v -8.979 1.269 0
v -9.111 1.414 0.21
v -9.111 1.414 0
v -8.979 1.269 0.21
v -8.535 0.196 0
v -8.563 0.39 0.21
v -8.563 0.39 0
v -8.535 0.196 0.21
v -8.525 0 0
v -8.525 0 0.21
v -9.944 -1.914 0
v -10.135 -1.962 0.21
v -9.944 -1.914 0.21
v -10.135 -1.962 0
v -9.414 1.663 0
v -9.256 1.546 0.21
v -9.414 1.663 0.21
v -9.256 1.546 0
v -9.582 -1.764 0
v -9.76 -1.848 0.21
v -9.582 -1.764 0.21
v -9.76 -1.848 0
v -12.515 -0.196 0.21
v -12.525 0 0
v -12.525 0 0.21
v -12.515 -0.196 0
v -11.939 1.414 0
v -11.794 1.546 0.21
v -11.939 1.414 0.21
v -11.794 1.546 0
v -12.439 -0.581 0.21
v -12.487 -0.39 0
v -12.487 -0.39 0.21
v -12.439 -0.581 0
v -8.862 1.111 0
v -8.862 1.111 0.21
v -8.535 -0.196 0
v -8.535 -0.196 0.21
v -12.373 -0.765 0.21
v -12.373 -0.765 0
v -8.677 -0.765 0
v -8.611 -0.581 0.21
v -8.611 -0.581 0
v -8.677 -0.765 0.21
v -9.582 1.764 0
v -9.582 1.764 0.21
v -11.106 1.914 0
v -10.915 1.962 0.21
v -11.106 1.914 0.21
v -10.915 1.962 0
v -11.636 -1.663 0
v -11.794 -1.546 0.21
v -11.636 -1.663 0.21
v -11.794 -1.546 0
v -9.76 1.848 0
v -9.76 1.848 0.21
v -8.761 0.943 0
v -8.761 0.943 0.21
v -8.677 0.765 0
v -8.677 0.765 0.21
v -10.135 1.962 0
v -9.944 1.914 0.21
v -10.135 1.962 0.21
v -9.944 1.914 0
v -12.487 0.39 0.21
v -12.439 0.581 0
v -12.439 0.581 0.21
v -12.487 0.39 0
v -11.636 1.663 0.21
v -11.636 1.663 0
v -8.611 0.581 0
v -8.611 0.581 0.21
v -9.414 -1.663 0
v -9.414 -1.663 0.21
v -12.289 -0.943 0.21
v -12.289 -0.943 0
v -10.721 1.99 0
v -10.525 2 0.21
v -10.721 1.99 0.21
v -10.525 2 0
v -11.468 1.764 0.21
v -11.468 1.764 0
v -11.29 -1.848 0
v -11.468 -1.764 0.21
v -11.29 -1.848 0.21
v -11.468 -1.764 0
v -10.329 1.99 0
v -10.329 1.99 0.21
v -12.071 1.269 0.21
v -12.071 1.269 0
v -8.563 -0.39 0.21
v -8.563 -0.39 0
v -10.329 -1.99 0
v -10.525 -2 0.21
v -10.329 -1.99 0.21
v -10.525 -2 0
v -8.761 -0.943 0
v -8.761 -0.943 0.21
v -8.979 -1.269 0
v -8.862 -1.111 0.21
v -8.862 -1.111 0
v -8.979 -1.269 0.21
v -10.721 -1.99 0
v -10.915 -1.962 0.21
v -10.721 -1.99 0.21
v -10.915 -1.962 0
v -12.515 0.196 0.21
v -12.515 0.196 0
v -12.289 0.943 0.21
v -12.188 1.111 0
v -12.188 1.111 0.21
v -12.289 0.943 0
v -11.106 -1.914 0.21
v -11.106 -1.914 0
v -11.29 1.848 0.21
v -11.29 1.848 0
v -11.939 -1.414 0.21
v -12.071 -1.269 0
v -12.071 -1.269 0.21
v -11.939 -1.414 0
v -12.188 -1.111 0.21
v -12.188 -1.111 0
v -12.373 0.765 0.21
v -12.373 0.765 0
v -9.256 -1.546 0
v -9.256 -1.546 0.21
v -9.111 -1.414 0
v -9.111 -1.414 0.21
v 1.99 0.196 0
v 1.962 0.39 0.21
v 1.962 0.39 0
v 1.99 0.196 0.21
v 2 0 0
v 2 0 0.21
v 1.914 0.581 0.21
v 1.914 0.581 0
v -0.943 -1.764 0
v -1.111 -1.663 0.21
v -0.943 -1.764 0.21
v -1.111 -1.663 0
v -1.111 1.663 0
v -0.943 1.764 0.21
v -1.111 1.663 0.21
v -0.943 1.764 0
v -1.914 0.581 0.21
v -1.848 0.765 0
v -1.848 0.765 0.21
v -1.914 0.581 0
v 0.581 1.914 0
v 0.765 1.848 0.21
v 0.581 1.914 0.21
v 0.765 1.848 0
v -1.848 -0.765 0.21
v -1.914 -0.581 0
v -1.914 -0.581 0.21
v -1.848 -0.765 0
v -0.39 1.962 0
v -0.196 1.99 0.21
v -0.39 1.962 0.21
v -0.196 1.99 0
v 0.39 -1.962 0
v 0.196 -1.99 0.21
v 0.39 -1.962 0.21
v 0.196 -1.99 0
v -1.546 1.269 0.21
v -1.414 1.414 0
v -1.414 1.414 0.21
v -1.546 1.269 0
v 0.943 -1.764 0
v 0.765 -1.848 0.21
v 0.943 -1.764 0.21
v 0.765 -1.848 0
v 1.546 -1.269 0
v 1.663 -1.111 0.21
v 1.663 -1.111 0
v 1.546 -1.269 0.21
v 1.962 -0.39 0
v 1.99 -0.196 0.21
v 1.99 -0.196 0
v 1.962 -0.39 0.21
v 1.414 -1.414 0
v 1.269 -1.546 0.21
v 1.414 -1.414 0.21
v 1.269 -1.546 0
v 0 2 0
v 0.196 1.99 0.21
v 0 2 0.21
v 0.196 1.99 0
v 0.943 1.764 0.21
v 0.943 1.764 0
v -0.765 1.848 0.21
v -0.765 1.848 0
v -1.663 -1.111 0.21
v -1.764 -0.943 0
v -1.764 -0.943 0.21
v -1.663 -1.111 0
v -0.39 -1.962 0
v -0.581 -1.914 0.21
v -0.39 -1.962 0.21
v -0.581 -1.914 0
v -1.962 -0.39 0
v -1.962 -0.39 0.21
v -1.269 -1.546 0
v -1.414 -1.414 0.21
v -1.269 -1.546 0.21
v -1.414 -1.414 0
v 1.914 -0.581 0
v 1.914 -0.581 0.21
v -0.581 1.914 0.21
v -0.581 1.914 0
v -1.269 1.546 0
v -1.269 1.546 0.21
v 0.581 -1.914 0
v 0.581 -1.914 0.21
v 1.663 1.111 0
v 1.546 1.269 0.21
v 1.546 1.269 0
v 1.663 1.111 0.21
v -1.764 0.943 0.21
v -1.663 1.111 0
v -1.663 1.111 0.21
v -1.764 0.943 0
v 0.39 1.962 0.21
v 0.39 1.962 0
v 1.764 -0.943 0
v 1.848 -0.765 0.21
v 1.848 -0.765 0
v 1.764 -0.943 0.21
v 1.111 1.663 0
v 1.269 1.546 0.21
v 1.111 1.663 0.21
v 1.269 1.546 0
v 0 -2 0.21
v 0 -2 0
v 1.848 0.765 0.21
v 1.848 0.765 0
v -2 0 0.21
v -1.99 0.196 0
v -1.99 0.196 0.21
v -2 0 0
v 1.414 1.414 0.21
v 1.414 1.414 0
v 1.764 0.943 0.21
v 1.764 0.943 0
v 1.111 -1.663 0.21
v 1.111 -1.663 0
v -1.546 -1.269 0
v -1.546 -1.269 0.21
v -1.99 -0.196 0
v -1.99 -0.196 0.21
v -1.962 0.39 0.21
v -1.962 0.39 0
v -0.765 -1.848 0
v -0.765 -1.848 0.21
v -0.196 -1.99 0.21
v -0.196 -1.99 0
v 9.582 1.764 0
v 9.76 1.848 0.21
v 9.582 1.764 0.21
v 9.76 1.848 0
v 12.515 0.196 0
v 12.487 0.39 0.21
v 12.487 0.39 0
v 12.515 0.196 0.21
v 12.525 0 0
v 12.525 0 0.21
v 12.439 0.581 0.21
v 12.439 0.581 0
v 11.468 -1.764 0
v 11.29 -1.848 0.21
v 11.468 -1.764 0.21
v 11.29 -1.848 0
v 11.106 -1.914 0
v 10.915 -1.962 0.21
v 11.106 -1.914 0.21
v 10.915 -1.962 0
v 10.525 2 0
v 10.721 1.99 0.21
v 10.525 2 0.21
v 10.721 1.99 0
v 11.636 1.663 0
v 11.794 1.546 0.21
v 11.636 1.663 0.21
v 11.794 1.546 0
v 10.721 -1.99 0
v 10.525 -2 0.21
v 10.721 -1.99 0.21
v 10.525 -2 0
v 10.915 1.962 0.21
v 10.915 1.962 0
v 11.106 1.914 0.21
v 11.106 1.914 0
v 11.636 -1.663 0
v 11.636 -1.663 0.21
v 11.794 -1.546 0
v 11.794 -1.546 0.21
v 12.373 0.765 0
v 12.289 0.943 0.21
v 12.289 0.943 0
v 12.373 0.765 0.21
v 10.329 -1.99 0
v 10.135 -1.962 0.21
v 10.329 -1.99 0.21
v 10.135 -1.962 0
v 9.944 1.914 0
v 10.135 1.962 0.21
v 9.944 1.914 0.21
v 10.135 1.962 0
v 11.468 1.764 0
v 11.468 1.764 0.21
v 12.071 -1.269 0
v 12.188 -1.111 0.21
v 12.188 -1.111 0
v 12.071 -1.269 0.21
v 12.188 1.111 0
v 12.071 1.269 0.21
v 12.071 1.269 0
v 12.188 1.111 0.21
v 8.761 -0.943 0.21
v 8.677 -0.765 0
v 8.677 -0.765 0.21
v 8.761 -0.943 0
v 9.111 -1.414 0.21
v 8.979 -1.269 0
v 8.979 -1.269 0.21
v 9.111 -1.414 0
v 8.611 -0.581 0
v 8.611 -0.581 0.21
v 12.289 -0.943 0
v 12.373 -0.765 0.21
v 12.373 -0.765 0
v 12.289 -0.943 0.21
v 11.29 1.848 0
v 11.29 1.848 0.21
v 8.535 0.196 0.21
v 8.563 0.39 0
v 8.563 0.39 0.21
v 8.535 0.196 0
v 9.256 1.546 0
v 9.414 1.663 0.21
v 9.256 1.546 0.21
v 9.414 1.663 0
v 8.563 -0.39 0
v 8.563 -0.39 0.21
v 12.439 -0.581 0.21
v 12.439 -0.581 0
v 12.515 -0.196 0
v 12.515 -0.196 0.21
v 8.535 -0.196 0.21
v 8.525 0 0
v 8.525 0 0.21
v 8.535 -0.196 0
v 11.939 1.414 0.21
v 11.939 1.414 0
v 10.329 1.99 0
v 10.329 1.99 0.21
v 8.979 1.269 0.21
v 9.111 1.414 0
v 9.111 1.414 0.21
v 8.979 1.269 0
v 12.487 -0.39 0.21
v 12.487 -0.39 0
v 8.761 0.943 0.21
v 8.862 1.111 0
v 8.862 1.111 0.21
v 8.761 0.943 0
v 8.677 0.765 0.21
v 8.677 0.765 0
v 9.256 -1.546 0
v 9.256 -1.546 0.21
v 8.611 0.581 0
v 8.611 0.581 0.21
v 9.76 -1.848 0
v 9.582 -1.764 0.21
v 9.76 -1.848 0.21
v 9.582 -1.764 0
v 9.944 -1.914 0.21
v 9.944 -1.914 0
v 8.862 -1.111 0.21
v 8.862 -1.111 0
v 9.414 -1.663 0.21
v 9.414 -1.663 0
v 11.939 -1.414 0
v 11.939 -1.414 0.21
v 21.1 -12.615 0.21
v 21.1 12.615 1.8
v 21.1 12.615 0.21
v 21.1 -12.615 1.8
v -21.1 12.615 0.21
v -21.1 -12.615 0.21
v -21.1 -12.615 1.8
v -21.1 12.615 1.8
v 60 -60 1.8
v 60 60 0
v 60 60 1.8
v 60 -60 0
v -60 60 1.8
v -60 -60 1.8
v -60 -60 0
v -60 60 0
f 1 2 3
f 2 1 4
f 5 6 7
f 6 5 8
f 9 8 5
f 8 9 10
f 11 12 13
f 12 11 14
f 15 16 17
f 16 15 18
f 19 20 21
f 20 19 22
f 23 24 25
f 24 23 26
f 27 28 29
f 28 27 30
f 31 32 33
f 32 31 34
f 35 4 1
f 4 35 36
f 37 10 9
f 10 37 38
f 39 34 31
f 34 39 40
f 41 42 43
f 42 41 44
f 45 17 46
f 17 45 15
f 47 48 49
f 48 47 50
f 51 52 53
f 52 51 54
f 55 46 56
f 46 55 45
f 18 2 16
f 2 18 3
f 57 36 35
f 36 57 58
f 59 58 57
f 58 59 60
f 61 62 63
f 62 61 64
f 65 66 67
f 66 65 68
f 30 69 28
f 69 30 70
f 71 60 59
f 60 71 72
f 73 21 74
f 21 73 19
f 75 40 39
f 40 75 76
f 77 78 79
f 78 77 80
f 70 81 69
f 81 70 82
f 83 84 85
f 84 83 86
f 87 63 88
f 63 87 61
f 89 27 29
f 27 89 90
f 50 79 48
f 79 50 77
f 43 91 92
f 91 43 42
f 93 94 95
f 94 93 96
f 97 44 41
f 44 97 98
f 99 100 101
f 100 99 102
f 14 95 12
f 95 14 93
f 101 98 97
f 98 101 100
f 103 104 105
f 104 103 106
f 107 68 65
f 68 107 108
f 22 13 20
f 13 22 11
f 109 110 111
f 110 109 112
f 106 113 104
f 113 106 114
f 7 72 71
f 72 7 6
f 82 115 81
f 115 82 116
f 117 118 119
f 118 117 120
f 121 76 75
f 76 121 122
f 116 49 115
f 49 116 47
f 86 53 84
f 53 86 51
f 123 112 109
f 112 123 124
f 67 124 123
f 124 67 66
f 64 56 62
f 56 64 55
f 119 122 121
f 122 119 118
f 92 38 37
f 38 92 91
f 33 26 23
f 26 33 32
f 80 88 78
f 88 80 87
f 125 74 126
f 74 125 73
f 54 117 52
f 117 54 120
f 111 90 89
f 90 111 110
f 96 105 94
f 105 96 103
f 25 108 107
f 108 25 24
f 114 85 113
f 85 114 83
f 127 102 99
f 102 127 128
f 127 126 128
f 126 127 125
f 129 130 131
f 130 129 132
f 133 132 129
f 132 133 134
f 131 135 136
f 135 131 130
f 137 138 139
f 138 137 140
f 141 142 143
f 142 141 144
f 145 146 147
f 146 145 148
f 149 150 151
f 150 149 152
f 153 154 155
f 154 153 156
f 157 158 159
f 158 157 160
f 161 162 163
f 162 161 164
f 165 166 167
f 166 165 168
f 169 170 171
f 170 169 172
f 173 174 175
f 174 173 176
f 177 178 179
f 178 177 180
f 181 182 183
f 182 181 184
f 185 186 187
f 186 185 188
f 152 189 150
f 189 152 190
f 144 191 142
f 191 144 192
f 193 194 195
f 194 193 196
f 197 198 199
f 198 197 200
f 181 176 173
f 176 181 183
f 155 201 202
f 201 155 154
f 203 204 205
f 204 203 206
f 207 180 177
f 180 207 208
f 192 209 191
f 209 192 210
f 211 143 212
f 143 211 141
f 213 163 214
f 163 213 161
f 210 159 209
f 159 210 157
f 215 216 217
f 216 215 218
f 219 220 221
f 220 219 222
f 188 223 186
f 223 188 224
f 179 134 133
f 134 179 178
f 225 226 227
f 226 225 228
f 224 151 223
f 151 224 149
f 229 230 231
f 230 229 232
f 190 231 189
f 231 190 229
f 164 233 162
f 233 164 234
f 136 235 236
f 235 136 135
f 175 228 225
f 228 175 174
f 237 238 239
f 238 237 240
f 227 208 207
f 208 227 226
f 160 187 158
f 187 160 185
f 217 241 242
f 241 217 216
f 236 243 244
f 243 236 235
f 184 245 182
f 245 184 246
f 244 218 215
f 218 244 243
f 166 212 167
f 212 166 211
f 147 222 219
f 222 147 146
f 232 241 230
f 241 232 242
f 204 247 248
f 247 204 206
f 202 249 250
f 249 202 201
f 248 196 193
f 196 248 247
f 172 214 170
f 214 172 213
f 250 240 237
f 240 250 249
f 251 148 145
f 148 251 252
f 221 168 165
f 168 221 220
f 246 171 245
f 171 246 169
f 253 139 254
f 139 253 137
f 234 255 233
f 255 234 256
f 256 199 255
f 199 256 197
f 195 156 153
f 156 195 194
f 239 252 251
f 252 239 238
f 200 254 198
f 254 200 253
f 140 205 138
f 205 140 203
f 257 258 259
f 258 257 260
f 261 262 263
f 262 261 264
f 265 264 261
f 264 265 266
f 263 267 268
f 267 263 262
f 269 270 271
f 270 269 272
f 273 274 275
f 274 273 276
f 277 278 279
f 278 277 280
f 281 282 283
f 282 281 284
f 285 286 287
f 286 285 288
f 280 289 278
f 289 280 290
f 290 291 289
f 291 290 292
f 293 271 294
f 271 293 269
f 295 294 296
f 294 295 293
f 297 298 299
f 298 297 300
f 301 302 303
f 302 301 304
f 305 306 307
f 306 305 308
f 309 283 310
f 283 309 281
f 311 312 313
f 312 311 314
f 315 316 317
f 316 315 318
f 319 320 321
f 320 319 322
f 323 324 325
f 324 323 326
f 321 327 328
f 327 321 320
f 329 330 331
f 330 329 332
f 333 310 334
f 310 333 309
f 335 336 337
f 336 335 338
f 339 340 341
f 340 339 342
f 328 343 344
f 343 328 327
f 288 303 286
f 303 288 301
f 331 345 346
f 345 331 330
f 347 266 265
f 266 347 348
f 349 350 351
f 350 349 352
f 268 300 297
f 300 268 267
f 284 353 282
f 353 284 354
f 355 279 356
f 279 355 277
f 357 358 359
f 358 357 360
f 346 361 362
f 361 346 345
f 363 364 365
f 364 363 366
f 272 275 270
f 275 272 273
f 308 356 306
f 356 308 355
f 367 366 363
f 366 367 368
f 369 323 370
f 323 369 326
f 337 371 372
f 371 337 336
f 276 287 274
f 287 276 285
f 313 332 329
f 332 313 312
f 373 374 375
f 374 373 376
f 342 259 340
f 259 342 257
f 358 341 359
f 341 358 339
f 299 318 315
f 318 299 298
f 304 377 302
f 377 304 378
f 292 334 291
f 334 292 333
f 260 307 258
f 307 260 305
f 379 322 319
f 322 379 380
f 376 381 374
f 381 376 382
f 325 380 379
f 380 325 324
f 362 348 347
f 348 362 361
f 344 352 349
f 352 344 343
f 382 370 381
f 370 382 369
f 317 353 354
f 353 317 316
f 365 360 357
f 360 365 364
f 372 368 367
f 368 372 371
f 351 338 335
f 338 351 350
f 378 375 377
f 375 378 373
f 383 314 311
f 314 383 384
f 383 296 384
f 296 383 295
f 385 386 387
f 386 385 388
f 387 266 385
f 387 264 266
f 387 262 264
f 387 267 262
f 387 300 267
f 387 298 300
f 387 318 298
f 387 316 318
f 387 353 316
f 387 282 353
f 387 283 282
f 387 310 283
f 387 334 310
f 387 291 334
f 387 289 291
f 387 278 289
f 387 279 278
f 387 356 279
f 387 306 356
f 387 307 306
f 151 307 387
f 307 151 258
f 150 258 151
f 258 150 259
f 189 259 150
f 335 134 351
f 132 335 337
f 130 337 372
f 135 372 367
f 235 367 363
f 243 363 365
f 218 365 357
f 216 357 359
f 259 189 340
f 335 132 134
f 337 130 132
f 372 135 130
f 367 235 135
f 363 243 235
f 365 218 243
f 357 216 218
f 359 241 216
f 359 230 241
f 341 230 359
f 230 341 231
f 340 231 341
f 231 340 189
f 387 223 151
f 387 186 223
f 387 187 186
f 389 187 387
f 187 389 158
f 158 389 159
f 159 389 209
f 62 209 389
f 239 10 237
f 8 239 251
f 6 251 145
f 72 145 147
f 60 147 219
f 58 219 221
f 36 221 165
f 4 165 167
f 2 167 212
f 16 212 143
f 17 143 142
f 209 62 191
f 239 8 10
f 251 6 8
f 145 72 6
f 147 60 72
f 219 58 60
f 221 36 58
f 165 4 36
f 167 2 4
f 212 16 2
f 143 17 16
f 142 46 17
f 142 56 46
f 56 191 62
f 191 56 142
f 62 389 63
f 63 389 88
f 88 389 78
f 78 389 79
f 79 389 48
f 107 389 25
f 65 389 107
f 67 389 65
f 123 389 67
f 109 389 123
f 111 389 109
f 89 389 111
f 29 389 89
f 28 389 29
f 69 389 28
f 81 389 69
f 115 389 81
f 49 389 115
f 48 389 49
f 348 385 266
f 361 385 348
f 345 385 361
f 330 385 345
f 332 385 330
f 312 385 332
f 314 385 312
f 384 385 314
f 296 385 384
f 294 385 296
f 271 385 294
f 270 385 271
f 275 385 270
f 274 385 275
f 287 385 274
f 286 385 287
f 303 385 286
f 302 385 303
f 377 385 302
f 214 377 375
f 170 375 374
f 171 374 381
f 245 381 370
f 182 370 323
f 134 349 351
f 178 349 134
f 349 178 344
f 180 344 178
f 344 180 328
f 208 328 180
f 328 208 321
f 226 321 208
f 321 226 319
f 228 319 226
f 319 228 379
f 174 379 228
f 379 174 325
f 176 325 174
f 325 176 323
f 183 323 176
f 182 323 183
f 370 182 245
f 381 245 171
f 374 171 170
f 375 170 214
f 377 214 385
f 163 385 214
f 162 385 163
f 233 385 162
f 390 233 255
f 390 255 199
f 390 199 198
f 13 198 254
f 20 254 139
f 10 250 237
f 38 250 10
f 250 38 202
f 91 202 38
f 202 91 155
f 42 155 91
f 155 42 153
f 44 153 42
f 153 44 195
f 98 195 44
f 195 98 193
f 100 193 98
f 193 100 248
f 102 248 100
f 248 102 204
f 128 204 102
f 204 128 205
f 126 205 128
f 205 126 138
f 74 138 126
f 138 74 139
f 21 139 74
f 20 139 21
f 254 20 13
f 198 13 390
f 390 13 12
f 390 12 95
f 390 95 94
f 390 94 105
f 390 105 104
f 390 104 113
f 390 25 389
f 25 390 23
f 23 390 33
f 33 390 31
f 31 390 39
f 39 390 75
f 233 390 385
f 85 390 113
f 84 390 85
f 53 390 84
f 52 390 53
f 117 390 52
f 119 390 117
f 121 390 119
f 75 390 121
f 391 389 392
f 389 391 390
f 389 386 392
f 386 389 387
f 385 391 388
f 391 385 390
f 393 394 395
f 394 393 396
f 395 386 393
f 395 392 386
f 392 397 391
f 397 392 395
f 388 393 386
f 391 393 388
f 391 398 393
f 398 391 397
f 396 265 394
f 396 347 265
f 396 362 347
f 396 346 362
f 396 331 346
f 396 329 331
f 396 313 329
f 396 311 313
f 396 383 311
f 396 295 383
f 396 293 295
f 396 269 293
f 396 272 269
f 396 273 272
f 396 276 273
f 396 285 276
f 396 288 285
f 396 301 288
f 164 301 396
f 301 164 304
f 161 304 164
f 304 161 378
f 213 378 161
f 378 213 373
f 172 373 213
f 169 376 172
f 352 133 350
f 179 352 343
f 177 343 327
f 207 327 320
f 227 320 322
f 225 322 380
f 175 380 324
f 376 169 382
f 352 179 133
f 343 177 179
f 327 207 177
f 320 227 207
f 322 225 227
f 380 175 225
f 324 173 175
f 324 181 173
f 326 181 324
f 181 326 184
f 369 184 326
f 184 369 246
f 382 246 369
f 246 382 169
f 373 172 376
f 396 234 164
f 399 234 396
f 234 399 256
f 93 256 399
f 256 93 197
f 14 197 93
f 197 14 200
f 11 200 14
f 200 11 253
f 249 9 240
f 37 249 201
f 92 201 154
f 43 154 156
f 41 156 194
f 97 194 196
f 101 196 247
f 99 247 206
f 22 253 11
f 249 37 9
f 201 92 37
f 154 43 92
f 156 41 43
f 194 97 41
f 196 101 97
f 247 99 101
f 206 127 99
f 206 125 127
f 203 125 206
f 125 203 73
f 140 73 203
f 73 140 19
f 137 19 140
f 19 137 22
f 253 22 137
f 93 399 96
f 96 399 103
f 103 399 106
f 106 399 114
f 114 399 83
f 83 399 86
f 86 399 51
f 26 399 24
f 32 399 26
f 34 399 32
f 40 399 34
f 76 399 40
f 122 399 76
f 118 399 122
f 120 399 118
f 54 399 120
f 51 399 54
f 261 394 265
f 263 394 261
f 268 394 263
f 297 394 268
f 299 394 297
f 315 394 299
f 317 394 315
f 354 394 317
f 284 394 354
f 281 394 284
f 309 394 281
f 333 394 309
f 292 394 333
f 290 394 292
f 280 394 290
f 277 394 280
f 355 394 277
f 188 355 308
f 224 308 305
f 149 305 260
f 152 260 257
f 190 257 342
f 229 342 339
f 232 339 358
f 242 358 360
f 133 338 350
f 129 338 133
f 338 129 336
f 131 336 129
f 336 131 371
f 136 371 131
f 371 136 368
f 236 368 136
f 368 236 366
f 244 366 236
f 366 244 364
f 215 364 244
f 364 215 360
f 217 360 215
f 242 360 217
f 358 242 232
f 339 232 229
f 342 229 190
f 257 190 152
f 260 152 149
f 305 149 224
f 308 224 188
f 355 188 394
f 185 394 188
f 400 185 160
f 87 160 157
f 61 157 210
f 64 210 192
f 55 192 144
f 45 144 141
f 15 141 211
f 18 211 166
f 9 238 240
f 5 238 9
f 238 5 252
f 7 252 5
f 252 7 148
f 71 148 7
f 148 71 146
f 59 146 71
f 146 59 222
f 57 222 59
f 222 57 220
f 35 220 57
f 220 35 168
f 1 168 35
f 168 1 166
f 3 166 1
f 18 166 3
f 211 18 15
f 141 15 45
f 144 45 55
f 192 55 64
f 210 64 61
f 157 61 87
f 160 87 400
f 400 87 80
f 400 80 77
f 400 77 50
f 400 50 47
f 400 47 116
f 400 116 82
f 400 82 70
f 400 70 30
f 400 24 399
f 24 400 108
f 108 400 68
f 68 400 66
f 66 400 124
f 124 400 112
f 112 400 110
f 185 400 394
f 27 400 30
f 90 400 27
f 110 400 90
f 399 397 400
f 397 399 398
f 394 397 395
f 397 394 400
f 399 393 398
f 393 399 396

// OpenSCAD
pcb = [42.1,25.13,1.6];
gap = 0.1;

base = [120, 120, 0.2];

module jig() {
    difference() {
        union() {
            translate([0, 0, (base.z+pcb.z)/2])
                cube(base + [0,0, pcb.z], center=true);
        }
        union() {
            translate([0, 0, base.z+pcb.z/2+0.01])
                cube(pcb+[1,1,0]*gap, center=true);
            
            for(i=[0:2])
                translate([(i-1)*pcb.x/4,0,-1])
                    cylinder(d=4, h=pcb.z+base.z+2);
        }
    }
}

jig();

module shim() {
    difference() {
        cube([41, 24, 0.8], center=true);
        translate([-27,0,-1])
            rotate([0,0,45])
                cube([100,100,100]);
    }
}

$fn = 64;
